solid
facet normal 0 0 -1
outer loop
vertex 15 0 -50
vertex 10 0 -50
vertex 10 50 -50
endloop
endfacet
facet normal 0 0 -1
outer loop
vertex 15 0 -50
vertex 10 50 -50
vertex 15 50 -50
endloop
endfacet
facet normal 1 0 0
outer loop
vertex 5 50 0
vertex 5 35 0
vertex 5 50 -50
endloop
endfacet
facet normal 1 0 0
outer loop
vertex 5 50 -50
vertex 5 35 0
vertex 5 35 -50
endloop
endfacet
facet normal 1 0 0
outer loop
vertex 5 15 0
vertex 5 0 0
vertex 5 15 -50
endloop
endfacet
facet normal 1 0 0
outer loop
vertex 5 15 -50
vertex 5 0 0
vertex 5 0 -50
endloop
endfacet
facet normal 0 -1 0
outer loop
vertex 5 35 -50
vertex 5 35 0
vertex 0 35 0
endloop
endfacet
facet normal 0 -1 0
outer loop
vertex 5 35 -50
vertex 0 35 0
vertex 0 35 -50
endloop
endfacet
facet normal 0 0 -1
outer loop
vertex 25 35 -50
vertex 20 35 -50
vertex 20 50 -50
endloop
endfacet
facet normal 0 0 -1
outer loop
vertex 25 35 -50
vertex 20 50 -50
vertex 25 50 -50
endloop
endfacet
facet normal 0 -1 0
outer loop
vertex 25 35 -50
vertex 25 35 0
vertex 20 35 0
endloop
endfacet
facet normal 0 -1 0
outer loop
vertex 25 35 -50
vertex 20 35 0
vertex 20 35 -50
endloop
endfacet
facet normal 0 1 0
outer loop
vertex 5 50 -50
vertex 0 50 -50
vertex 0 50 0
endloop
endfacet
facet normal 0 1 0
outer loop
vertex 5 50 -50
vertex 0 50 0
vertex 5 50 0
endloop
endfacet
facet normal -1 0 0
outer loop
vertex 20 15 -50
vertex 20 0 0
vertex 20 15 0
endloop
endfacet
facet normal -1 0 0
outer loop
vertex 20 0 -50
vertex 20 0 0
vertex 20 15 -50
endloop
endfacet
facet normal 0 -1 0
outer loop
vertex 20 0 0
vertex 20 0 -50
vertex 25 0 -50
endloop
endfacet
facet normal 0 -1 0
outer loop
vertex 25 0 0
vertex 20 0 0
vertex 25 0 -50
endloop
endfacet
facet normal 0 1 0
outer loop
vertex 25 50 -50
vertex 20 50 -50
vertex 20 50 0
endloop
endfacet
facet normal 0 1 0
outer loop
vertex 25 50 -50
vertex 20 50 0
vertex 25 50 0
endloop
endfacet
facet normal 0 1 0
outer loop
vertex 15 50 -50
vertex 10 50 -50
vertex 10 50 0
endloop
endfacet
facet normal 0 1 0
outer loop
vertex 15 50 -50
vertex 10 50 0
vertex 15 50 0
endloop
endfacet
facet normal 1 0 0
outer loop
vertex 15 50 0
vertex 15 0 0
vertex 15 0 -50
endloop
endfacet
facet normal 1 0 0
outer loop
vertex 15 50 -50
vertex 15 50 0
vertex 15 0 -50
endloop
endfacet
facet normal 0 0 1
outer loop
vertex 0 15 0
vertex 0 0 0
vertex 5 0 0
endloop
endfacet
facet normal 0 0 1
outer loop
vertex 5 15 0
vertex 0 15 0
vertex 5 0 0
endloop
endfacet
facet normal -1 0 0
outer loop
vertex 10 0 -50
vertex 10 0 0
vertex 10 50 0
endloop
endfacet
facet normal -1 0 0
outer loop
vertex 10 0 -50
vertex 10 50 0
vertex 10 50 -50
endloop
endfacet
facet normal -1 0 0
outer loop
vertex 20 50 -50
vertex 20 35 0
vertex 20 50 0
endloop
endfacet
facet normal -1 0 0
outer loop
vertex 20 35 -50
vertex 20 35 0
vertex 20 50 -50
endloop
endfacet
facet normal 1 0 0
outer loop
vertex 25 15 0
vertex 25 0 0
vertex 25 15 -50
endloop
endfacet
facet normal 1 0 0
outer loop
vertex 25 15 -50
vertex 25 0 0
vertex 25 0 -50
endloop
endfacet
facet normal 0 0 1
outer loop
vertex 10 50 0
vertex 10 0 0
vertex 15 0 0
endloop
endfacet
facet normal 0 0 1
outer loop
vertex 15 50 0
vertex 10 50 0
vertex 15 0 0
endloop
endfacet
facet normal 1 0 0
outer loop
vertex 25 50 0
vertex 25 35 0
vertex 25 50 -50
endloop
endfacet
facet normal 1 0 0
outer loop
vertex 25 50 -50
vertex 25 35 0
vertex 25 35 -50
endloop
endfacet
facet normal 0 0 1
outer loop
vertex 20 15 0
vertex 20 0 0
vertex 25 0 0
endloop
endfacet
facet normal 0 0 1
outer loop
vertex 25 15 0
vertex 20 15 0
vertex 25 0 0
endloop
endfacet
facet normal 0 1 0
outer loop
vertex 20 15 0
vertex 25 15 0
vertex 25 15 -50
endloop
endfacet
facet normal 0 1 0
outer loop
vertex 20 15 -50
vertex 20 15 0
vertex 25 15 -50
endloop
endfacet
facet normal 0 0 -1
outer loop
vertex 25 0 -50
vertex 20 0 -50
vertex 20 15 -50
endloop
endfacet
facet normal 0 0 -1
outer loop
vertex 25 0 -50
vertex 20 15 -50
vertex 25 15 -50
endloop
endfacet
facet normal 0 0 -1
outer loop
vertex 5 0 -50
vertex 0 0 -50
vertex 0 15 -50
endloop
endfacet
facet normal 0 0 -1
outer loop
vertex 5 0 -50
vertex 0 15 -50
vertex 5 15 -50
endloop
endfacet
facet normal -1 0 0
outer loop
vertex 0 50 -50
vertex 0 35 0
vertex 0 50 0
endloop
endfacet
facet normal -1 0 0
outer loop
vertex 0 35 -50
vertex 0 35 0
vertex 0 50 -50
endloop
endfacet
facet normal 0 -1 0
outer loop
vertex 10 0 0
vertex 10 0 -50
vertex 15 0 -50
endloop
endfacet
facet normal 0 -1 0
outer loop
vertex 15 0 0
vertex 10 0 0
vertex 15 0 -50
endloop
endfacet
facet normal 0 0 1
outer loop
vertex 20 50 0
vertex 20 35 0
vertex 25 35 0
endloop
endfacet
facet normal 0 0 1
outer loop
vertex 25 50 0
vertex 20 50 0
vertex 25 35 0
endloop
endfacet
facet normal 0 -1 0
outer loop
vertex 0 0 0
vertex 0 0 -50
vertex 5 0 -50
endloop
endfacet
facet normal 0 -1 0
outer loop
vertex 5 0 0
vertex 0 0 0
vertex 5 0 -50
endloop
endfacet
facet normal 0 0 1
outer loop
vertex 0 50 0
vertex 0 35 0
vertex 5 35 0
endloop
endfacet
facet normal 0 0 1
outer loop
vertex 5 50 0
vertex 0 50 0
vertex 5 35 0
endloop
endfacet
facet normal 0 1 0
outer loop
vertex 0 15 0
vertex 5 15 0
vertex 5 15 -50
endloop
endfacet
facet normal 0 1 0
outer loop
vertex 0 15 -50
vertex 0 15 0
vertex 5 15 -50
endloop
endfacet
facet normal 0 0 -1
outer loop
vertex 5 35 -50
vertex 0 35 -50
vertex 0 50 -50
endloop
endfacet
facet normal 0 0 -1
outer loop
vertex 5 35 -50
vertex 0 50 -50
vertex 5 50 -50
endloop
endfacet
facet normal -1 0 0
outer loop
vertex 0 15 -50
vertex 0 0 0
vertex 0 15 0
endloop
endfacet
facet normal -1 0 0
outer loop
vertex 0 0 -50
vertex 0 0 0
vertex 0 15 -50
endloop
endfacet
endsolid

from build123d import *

# Parameters (mm, degrees)
SKETCH1_W             = 5
SKETCH1_H             = 50
BOSS_EXTRUDE1_DEPTH   = 50
BOSS_EXTRUDE1_2_DEPTH = 50
BOSS_EXTRUDE1_3_DEPTH = 50
SKETCH2_W             = 50
SKETCH2_H             = 20
CUT_EXTRUDE1_DEPTH    = 26


with BuildPart() as part:
    # Sketch1 → Boss-Extrude1 (new body)
    with BuildSketch(Plane(origin=(0, 0, 0), x_dir=(1, 0, 0), z_dir=(0, 1, 0))):
        with Locations((12.5, 25)):
            Rectangle(SKETCH1_W, SKETCH1_H)
    extrude(amount=BOSS_EXTRUDE1_DEPTH)


with BuildPart() as body_2:
    # Sketch1 → Boss-Extrude1 2 (new body)
    with BuildSketch(Plane(origin=(0, 0, 0), x_dir=(1, 0, 0), z_dir=(0, 1, 0))):
        with Locations((2.5, 25)):
            Rectangle(SKETCH1_W, SKETCH1_H)
    extrude(amount=BOSS_EXTRUDE1_2_DEPTH)


with BuildPart() as body_3:
    # Sketch1 → Boss-Extrude1 3 (new body)
    with BuildSketch(Plane(origin=(0, 0, 0), x_dir=(1, 0, 0), z_dir=(0, 1, 0))):
        with Locations((22.5, 25)):
            Rectangle(SKETCH1_W, SKETCH1_H)
    extrude(amount=BOSS_EXTRUDE1_3_DEPTH)


with BuildPart() as cut_extrude1_tool:
    # Sketch2 → Cut-Extrude1 (new body, through all)
    with BuildSketch(Plane(origin=(25, 0, 0), x_dir=(0, 0, -1), z_dir=(1, 0, 0))):
        with Locations((25, 25)):
            Rectangle(SKETCH2_W, SKETCH2_H)
    extrude(amount=-CUT_EXTRUDE1_DEPTH)


with BuildPart() as body_3_1:
    add(body_3.part)

    # Cut-Extrude1: cut by cut_extrude1_tool
    add(cut_extrude1_tool.part, mode=Mode.SUBTRACT)


with BuildPart() as body_2_1:
    add(body_2.part)

    # Cut-Extrude1: cut by cut_extrude1_tool
    add(cut_extrude1_tool.part, mode=Mode.SUBTRACT)


solid = Compound([part.part, body_3_1.part, body_2_1.part])
